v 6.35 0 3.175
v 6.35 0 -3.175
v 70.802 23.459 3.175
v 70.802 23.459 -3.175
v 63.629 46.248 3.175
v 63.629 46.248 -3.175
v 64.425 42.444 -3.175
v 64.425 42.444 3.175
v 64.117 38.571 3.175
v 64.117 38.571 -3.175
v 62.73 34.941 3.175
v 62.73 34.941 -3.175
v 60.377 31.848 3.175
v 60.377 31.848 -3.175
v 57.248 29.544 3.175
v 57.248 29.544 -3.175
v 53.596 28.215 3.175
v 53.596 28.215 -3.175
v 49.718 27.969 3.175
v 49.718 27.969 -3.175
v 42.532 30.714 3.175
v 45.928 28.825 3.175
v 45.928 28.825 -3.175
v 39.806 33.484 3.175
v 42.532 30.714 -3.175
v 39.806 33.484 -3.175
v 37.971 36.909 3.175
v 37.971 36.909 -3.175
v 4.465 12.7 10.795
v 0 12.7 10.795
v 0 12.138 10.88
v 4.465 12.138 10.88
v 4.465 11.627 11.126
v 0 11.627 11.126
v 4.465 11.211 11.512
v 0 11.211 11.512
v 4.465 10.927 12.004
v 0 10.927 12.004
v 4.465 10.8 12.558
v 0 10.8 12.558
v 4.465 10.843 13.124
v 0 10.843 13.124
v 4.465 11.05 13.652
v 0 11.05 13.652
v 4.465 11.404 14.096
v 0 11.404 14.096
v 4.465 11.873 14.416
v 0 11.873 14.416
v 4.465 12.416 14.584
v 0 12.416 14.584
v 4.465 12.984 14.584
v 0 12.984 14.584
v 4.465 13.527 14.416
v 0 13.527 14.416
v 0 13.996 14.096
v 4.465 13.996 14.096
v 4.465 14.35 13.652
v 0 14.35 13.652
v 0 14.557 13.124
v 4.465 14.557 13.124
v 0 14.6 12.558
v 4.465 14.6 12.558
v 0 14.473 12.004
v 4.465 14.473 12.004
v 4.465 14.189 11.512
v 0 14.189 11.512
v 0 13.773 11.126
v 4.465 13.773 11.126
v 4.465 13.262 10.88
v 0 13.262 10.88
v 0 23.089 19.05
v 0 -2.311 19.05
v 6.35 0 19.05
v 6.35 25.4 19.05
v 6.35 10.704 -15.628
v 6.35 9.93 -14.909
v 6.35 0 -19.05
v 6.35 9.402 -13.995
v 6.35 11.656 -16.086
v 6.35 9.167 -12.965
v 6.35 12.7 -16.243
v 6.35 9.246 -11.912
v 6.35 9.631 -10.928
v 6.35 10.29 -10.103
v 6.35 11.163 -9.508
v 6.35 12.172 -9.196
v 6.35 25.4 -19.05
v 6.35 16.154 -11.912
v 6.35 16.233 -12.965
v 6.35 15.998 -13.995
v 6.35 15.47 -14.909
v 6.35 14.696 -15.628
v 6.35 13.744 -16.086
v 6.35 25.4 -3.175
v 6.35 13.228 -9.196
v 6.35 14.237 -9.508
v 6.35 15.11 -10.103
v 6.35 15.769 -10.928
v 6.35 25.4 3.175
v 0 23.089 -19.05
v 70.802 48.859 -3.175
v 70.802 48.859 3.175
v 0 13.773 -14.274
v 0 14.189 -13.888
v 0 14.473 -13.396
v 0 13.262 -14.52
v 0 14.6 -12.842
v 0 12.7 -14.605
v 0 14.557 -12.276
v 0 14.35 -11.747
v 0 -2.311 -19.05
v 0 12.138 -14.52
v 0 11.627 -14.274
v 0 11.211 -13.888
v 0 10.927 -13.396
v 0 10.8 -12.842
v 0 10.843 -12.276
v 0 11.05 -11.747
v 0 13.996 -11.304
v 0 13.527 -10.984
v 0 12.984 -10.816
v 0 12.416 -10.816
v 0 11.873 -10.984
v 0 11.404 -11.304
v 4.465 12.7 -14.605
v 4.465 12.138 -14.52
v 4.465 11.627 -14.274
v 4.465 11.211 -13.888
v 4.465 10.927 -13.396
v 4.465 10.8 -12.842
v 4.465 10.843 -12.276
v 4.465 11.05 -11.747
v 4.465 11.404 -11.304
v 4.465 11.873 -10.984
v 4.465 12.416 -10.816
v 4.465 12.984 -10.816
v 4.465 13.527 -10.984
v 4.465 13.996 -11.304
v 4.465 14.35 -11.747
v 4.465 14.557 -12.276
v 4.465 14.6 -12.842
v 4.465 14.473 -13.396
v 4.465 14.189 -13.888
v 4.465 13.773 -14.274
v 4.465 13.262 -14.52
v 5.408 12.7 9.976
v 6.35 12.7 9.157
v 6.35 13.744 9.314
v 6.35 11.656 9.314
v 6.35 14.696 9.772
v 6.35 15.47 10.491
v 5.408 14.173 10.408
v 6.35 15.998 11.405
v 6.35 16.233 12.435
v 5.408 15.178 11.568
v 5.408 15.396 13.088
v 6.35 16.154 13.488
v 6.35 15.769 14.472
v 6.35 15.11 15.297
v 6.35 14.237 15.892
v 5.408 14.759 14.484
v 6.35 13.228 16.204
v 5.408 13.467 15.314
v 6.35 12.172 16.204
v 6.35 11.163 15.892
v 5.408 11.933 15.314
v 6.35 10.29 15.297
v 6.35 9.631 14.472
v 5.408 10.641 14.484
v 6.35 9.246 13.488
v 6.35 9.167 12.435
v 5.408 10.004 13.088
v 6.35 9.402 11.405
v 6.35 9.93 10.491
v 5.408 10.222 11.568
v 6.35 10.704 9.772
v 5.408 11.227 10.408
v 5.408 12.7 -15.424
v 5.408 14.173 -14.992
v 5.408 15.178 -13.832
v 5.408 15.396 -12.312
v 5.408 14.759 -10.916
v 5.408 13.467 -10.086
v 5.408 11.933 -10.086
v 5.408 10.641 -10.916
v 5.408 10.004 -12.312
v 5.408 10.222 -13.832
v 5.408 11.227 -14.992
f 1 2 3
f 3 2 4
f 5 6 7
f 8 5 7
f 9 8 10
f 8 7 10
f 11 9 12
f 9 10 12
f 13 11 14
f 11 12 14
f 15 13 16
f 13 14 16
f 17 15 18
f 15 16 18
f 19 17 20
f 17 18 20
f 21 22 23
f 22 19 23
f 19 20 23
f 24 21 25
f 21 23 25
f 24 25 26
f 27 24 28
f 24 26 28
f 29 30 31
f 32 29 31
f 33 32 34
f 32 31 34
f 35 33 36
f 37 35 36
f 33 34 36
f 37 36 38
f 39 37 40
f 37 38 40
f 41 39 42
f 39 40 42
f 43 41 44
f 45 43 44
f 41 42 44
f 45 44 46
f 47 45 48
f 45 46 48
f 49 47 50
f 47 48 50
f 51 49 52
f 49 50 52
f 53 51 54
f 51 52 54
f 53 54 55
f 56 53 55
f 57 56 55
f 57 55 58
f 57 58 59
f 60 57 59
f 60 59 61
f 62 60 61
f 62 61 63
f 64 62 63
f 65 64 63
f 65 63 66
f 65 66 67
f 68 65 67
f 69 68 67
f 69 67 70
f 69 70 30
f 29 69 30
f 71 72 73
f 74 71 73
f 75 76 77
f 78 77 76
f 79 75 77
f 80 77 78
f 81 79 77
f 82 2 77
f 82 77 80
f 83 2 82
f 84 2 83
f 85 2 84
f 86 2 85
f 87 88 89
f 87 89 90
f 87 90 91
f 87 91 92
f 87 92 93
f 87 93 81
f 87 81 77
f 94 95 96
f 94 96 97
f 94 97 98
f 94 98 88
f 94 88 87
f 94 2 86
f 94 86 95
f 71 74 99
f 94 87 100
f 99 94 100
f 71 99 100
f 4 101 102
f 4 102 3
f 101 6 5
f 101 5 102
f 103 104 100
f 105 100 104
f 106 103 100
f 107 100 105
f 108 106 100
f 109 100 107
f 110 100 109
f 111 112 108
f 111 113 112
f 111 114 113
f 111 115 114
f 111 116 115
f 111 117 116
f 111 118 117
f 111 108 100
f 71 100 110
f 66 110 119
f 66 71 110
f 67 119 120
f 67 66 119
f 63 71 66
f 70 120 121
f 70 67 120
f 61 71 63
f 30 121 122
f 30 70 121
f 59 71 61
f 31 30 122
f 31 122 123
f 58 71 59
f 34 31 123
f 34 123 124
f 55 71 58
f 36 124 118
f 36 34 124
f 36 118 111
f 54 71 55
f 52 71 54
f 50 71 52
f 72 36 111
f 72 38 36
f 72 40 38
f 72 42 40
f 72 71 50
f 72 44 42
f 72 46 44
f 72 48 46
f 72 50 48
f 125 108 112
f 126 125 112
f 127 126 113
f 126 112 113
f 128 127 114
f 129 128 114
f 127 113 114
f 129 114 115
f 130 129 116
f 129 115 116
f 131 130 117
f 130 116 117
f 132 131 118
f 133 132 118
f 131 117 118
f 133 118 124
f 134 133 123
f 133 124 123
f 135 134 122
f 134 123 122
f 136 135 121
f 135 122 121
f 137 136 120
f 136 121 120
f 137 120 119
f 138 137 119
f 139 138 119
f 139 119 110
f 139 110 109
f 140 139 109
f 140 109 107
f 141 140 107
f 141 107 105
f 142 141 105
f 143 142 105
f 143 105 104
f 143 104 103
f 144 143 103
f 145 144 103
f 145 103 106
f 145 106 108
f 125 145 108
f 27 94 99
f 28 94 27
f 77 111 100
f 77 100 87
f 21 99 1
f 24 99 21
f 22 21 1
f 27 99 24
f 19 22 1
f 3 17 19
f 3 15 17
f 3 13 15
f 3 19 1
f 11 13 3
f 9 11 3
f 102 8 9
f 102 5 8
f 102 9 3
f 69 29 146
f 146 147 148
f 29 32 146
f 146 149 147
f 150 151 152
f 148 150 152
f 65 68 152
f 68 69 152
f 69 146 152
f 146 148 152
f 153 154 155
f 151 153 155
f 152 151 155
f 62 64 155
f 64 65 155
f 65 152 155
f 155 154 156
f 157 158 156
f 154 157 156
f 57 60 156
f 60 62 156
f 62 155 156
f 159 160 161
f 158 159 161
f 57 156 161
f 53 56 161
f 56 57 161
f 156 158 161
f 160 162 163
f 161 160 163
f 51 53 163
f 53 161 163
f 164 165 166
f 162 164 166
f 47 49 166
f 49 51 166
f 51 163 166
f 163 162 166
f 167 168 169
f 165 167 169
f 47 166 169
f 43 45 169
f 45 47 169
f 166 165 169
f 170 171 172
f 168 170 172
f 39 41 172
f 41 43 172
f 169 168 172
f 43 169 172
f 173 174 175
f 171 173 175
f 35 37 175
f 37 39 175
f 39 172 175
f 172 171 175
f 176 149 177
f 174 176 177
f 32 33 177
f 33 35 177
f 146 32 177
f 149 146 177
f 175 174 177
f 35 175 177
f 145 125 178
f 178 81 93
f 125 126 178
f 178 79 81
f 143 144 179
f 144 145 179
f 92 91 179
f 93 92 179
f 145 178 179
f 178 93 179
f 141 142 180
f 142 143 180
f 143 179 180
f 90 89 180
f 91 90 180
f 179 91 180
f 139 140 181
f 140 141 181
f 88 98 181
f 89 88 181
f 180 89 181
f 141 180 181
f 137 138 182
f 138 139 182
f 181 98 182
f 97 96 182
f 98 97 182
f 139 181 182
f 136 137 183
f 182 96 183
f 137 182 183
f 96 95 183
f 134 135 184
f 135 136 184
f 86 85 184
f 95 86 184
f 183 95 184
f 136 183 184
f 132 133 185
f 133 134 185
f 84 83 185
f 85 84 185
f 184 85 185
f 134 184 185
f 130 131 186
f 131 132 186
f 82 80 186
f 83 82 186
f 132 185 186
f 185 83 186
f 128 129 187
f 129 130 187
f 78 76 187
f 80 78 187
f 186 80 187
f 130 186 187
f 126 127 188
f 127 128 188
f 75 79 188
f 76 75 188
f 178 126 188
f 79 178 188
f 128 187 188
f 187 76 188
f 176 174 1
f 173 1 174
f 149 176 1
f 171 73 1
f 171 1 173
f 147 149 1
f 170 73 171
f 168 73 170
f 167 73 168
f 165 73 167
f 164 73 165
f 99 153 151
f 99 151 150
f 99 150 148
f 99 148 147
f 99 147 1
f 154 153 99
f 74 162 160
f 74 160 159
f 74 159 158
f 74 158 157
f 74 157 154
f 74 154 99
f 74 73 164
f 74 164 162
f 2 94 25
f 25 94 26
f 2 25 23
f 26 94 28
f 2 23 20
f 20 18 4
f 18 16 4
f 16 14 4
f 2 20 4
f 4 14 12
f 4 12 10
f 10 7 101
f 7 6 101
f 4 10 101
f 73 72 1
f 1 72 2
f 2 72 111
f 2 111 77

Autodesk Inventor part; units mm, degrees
ref_plane "YZ Plane" through (0, 0, 0) normal (1, 0, 0) x (0, 1, 0)
ref_plane "XZ Plane" through (0, 0, 0) normal (0, 1, 0) x (-1, 0, 0)
sketch "Sketch5" plane through (0, 0, 0) normal (0, 0, 1) x (1, 0, 0)
  line L0 (0, 0) -> (6.35, 0)
  line L1 (6.35, 0) -> (6.35, 25.4)
  line L2 (6.35, 25.4) -> (0, 25.4)
  line L3 (0, 25.4) -> (0, 0)
  dimension "d21" = 25.4
  dimension "d22" = 6.35
extrude "Extrusion3" add sketch "Sketch5" against normal mid plane 38.1
sketch "Sketch6" plane through (0, 0, 0) normal (0, 0, 1) x (1, 0, 0)
  line L0 (6.35, 25.4) -> (6.35, 0) projected
  line L1 (0, 25.4) -> (6.35, 25.4) projected
  line L2 (6.35, 0) -> (0, 0) projected
  line L3 (0, 0) -> (0, 25.4) projected
  line L4 (6.35, 0) -> (70.8025, 23.4588)
  line L5 (6.35, 0) -> (74.9389, 0) construction
  line L6 (70.8025, 48.8588) -> (70.8025, 23.4588)
  arc A0 (37.9708, 36.909) -> (63.6292, 46.2479) centre (50.8, 41.5785) ccw
  line L7 (6.35, 25.4) -> (37.9708, 36.909)
  line L8 (63.6292, 46.2479) -> (70.8025, 48.8588)
  dimension "d25" = 20
  dimension "d26" = 27.305
  dimension "d29" = 6.35
  dimension "d30" = 50.8
  dimension "d33" = 0
extrude "Extrusion4" add sketch "Sketch6" along normal mid plane 6.35 contours L7 A0 L8 L6 L4 L0
sketch "Sketch7" plane through (6.35, 0, 19.05) normal (1, 0, 0) x (0, 0, -1)
  line L0 (38.1, 25.4) -> (0, 25.4) construction
  line L1 (6.35, 25.4) -> (6.35, 0) construction
  line L2 (31.75, 25.4) -> (31.75, 0) construction
  line L3 (0, 0) -> (0, 25.4) construction
  line L4 (38.1, 25.4) -> (38.1, 0) construction
  line L5 (0, 0) -> (15.875, 0) projected
  line L6 (22.225, 0) -> (38.1, 0) projected
  point P0 (19.05, 0)
  point P1 (6.35, 12.7)
  point P2 (31.75, 12.7)
  dimension "d34" = 6.35
  dimension "d35" = 6.35
sketch "Sketch8" plane through (0, 0, 0) normal (0, 0, 1) x (1, 0, 0)
  line L0 (0, 0) -> (0, 25.4) projected
  line L1 (6.35, 0) -> (0, 0) projected
  line L2 (70.8025, 23.4588) -> (6.35, 0) projected
  line L3 (0, 0) -> (6.35, 0)
  line L4 (0, -2.3112) -> (6.35, 0)
  line L5 (0, 0) -> (0, -2.3112)
extrude "Extrusion5" add sketch "Sketch8" along normal mid plane 38.1
hole "Hole3" at (6.35, 12.7, 12.7) at (6.35, 12.7, -12.7) direction (-1, 0, 0) diameter 3.81 end through all countersink diameter 7.0866 countersink angle 82 clearance for "Flat Head Machine Screw (82)" size "#6" standard "Ansi Unified Screw Threads"
sketch "Sketch9" plane through (0, 0, 0) normal (0, 0, 1) x (1, 0, 0)
  line L0 (0, -2.3112) -> (0, 25.4) projected
  line L1 (0, 25.4) -> (6.35, 25.4) projected
  line L2 (6.35, 25.4) -> (37.9708, 36.909) projected
  line L3 (6.35, 25.4) -> (6.35, 0) projected
  line L4 (6.35, 25.4) -> (0, 25.4)
  line L5 (6.35, 25.4) -> (6.35, 0) projected
  line L6 (6.35, 25.4) -> (0, 23.0888)
  line L7 (0, 25.4) -> (0, 23.0888)
  point P0 (0, 0)
extrude "Extrusion6" cut sketch "Sketch9" along normal mid plane 38.1
equation "\"d21\" = supportHeight"
equation "\"d22\" = supportWidth"
equation "\"d23\" = totalScrewHoldWidth"
equation "\"d25\" = supportAngle"
equation "\"d26\" = pipeDiameter"
equation "\"d30\" = distanceFromWallToPipeCenter"
equation "\"d31\" = supportWidth"
equation "\"d47\" = totalScrewHoldWidth"
equation "\"d62\" = totalScrewHoldWidth"
equation "\"pipeDiameter\" = 27.305"
equation "\"distanceFromWallToPipeCenter\" = 50.8"
equation "\"supportHeight\" = 25.4"
equation "\"supportWidth\" = 6.35"
equation "\"screwHoldDepth\" = 6.35"
equation "\"totalScrewHoldWidth\" = 38.1"
equation "\"screwPositionFromTop\" = 6.35"
equation "\"supportAngle\" = 20deg"
properties part number "PipeSupport-2_00-020"
